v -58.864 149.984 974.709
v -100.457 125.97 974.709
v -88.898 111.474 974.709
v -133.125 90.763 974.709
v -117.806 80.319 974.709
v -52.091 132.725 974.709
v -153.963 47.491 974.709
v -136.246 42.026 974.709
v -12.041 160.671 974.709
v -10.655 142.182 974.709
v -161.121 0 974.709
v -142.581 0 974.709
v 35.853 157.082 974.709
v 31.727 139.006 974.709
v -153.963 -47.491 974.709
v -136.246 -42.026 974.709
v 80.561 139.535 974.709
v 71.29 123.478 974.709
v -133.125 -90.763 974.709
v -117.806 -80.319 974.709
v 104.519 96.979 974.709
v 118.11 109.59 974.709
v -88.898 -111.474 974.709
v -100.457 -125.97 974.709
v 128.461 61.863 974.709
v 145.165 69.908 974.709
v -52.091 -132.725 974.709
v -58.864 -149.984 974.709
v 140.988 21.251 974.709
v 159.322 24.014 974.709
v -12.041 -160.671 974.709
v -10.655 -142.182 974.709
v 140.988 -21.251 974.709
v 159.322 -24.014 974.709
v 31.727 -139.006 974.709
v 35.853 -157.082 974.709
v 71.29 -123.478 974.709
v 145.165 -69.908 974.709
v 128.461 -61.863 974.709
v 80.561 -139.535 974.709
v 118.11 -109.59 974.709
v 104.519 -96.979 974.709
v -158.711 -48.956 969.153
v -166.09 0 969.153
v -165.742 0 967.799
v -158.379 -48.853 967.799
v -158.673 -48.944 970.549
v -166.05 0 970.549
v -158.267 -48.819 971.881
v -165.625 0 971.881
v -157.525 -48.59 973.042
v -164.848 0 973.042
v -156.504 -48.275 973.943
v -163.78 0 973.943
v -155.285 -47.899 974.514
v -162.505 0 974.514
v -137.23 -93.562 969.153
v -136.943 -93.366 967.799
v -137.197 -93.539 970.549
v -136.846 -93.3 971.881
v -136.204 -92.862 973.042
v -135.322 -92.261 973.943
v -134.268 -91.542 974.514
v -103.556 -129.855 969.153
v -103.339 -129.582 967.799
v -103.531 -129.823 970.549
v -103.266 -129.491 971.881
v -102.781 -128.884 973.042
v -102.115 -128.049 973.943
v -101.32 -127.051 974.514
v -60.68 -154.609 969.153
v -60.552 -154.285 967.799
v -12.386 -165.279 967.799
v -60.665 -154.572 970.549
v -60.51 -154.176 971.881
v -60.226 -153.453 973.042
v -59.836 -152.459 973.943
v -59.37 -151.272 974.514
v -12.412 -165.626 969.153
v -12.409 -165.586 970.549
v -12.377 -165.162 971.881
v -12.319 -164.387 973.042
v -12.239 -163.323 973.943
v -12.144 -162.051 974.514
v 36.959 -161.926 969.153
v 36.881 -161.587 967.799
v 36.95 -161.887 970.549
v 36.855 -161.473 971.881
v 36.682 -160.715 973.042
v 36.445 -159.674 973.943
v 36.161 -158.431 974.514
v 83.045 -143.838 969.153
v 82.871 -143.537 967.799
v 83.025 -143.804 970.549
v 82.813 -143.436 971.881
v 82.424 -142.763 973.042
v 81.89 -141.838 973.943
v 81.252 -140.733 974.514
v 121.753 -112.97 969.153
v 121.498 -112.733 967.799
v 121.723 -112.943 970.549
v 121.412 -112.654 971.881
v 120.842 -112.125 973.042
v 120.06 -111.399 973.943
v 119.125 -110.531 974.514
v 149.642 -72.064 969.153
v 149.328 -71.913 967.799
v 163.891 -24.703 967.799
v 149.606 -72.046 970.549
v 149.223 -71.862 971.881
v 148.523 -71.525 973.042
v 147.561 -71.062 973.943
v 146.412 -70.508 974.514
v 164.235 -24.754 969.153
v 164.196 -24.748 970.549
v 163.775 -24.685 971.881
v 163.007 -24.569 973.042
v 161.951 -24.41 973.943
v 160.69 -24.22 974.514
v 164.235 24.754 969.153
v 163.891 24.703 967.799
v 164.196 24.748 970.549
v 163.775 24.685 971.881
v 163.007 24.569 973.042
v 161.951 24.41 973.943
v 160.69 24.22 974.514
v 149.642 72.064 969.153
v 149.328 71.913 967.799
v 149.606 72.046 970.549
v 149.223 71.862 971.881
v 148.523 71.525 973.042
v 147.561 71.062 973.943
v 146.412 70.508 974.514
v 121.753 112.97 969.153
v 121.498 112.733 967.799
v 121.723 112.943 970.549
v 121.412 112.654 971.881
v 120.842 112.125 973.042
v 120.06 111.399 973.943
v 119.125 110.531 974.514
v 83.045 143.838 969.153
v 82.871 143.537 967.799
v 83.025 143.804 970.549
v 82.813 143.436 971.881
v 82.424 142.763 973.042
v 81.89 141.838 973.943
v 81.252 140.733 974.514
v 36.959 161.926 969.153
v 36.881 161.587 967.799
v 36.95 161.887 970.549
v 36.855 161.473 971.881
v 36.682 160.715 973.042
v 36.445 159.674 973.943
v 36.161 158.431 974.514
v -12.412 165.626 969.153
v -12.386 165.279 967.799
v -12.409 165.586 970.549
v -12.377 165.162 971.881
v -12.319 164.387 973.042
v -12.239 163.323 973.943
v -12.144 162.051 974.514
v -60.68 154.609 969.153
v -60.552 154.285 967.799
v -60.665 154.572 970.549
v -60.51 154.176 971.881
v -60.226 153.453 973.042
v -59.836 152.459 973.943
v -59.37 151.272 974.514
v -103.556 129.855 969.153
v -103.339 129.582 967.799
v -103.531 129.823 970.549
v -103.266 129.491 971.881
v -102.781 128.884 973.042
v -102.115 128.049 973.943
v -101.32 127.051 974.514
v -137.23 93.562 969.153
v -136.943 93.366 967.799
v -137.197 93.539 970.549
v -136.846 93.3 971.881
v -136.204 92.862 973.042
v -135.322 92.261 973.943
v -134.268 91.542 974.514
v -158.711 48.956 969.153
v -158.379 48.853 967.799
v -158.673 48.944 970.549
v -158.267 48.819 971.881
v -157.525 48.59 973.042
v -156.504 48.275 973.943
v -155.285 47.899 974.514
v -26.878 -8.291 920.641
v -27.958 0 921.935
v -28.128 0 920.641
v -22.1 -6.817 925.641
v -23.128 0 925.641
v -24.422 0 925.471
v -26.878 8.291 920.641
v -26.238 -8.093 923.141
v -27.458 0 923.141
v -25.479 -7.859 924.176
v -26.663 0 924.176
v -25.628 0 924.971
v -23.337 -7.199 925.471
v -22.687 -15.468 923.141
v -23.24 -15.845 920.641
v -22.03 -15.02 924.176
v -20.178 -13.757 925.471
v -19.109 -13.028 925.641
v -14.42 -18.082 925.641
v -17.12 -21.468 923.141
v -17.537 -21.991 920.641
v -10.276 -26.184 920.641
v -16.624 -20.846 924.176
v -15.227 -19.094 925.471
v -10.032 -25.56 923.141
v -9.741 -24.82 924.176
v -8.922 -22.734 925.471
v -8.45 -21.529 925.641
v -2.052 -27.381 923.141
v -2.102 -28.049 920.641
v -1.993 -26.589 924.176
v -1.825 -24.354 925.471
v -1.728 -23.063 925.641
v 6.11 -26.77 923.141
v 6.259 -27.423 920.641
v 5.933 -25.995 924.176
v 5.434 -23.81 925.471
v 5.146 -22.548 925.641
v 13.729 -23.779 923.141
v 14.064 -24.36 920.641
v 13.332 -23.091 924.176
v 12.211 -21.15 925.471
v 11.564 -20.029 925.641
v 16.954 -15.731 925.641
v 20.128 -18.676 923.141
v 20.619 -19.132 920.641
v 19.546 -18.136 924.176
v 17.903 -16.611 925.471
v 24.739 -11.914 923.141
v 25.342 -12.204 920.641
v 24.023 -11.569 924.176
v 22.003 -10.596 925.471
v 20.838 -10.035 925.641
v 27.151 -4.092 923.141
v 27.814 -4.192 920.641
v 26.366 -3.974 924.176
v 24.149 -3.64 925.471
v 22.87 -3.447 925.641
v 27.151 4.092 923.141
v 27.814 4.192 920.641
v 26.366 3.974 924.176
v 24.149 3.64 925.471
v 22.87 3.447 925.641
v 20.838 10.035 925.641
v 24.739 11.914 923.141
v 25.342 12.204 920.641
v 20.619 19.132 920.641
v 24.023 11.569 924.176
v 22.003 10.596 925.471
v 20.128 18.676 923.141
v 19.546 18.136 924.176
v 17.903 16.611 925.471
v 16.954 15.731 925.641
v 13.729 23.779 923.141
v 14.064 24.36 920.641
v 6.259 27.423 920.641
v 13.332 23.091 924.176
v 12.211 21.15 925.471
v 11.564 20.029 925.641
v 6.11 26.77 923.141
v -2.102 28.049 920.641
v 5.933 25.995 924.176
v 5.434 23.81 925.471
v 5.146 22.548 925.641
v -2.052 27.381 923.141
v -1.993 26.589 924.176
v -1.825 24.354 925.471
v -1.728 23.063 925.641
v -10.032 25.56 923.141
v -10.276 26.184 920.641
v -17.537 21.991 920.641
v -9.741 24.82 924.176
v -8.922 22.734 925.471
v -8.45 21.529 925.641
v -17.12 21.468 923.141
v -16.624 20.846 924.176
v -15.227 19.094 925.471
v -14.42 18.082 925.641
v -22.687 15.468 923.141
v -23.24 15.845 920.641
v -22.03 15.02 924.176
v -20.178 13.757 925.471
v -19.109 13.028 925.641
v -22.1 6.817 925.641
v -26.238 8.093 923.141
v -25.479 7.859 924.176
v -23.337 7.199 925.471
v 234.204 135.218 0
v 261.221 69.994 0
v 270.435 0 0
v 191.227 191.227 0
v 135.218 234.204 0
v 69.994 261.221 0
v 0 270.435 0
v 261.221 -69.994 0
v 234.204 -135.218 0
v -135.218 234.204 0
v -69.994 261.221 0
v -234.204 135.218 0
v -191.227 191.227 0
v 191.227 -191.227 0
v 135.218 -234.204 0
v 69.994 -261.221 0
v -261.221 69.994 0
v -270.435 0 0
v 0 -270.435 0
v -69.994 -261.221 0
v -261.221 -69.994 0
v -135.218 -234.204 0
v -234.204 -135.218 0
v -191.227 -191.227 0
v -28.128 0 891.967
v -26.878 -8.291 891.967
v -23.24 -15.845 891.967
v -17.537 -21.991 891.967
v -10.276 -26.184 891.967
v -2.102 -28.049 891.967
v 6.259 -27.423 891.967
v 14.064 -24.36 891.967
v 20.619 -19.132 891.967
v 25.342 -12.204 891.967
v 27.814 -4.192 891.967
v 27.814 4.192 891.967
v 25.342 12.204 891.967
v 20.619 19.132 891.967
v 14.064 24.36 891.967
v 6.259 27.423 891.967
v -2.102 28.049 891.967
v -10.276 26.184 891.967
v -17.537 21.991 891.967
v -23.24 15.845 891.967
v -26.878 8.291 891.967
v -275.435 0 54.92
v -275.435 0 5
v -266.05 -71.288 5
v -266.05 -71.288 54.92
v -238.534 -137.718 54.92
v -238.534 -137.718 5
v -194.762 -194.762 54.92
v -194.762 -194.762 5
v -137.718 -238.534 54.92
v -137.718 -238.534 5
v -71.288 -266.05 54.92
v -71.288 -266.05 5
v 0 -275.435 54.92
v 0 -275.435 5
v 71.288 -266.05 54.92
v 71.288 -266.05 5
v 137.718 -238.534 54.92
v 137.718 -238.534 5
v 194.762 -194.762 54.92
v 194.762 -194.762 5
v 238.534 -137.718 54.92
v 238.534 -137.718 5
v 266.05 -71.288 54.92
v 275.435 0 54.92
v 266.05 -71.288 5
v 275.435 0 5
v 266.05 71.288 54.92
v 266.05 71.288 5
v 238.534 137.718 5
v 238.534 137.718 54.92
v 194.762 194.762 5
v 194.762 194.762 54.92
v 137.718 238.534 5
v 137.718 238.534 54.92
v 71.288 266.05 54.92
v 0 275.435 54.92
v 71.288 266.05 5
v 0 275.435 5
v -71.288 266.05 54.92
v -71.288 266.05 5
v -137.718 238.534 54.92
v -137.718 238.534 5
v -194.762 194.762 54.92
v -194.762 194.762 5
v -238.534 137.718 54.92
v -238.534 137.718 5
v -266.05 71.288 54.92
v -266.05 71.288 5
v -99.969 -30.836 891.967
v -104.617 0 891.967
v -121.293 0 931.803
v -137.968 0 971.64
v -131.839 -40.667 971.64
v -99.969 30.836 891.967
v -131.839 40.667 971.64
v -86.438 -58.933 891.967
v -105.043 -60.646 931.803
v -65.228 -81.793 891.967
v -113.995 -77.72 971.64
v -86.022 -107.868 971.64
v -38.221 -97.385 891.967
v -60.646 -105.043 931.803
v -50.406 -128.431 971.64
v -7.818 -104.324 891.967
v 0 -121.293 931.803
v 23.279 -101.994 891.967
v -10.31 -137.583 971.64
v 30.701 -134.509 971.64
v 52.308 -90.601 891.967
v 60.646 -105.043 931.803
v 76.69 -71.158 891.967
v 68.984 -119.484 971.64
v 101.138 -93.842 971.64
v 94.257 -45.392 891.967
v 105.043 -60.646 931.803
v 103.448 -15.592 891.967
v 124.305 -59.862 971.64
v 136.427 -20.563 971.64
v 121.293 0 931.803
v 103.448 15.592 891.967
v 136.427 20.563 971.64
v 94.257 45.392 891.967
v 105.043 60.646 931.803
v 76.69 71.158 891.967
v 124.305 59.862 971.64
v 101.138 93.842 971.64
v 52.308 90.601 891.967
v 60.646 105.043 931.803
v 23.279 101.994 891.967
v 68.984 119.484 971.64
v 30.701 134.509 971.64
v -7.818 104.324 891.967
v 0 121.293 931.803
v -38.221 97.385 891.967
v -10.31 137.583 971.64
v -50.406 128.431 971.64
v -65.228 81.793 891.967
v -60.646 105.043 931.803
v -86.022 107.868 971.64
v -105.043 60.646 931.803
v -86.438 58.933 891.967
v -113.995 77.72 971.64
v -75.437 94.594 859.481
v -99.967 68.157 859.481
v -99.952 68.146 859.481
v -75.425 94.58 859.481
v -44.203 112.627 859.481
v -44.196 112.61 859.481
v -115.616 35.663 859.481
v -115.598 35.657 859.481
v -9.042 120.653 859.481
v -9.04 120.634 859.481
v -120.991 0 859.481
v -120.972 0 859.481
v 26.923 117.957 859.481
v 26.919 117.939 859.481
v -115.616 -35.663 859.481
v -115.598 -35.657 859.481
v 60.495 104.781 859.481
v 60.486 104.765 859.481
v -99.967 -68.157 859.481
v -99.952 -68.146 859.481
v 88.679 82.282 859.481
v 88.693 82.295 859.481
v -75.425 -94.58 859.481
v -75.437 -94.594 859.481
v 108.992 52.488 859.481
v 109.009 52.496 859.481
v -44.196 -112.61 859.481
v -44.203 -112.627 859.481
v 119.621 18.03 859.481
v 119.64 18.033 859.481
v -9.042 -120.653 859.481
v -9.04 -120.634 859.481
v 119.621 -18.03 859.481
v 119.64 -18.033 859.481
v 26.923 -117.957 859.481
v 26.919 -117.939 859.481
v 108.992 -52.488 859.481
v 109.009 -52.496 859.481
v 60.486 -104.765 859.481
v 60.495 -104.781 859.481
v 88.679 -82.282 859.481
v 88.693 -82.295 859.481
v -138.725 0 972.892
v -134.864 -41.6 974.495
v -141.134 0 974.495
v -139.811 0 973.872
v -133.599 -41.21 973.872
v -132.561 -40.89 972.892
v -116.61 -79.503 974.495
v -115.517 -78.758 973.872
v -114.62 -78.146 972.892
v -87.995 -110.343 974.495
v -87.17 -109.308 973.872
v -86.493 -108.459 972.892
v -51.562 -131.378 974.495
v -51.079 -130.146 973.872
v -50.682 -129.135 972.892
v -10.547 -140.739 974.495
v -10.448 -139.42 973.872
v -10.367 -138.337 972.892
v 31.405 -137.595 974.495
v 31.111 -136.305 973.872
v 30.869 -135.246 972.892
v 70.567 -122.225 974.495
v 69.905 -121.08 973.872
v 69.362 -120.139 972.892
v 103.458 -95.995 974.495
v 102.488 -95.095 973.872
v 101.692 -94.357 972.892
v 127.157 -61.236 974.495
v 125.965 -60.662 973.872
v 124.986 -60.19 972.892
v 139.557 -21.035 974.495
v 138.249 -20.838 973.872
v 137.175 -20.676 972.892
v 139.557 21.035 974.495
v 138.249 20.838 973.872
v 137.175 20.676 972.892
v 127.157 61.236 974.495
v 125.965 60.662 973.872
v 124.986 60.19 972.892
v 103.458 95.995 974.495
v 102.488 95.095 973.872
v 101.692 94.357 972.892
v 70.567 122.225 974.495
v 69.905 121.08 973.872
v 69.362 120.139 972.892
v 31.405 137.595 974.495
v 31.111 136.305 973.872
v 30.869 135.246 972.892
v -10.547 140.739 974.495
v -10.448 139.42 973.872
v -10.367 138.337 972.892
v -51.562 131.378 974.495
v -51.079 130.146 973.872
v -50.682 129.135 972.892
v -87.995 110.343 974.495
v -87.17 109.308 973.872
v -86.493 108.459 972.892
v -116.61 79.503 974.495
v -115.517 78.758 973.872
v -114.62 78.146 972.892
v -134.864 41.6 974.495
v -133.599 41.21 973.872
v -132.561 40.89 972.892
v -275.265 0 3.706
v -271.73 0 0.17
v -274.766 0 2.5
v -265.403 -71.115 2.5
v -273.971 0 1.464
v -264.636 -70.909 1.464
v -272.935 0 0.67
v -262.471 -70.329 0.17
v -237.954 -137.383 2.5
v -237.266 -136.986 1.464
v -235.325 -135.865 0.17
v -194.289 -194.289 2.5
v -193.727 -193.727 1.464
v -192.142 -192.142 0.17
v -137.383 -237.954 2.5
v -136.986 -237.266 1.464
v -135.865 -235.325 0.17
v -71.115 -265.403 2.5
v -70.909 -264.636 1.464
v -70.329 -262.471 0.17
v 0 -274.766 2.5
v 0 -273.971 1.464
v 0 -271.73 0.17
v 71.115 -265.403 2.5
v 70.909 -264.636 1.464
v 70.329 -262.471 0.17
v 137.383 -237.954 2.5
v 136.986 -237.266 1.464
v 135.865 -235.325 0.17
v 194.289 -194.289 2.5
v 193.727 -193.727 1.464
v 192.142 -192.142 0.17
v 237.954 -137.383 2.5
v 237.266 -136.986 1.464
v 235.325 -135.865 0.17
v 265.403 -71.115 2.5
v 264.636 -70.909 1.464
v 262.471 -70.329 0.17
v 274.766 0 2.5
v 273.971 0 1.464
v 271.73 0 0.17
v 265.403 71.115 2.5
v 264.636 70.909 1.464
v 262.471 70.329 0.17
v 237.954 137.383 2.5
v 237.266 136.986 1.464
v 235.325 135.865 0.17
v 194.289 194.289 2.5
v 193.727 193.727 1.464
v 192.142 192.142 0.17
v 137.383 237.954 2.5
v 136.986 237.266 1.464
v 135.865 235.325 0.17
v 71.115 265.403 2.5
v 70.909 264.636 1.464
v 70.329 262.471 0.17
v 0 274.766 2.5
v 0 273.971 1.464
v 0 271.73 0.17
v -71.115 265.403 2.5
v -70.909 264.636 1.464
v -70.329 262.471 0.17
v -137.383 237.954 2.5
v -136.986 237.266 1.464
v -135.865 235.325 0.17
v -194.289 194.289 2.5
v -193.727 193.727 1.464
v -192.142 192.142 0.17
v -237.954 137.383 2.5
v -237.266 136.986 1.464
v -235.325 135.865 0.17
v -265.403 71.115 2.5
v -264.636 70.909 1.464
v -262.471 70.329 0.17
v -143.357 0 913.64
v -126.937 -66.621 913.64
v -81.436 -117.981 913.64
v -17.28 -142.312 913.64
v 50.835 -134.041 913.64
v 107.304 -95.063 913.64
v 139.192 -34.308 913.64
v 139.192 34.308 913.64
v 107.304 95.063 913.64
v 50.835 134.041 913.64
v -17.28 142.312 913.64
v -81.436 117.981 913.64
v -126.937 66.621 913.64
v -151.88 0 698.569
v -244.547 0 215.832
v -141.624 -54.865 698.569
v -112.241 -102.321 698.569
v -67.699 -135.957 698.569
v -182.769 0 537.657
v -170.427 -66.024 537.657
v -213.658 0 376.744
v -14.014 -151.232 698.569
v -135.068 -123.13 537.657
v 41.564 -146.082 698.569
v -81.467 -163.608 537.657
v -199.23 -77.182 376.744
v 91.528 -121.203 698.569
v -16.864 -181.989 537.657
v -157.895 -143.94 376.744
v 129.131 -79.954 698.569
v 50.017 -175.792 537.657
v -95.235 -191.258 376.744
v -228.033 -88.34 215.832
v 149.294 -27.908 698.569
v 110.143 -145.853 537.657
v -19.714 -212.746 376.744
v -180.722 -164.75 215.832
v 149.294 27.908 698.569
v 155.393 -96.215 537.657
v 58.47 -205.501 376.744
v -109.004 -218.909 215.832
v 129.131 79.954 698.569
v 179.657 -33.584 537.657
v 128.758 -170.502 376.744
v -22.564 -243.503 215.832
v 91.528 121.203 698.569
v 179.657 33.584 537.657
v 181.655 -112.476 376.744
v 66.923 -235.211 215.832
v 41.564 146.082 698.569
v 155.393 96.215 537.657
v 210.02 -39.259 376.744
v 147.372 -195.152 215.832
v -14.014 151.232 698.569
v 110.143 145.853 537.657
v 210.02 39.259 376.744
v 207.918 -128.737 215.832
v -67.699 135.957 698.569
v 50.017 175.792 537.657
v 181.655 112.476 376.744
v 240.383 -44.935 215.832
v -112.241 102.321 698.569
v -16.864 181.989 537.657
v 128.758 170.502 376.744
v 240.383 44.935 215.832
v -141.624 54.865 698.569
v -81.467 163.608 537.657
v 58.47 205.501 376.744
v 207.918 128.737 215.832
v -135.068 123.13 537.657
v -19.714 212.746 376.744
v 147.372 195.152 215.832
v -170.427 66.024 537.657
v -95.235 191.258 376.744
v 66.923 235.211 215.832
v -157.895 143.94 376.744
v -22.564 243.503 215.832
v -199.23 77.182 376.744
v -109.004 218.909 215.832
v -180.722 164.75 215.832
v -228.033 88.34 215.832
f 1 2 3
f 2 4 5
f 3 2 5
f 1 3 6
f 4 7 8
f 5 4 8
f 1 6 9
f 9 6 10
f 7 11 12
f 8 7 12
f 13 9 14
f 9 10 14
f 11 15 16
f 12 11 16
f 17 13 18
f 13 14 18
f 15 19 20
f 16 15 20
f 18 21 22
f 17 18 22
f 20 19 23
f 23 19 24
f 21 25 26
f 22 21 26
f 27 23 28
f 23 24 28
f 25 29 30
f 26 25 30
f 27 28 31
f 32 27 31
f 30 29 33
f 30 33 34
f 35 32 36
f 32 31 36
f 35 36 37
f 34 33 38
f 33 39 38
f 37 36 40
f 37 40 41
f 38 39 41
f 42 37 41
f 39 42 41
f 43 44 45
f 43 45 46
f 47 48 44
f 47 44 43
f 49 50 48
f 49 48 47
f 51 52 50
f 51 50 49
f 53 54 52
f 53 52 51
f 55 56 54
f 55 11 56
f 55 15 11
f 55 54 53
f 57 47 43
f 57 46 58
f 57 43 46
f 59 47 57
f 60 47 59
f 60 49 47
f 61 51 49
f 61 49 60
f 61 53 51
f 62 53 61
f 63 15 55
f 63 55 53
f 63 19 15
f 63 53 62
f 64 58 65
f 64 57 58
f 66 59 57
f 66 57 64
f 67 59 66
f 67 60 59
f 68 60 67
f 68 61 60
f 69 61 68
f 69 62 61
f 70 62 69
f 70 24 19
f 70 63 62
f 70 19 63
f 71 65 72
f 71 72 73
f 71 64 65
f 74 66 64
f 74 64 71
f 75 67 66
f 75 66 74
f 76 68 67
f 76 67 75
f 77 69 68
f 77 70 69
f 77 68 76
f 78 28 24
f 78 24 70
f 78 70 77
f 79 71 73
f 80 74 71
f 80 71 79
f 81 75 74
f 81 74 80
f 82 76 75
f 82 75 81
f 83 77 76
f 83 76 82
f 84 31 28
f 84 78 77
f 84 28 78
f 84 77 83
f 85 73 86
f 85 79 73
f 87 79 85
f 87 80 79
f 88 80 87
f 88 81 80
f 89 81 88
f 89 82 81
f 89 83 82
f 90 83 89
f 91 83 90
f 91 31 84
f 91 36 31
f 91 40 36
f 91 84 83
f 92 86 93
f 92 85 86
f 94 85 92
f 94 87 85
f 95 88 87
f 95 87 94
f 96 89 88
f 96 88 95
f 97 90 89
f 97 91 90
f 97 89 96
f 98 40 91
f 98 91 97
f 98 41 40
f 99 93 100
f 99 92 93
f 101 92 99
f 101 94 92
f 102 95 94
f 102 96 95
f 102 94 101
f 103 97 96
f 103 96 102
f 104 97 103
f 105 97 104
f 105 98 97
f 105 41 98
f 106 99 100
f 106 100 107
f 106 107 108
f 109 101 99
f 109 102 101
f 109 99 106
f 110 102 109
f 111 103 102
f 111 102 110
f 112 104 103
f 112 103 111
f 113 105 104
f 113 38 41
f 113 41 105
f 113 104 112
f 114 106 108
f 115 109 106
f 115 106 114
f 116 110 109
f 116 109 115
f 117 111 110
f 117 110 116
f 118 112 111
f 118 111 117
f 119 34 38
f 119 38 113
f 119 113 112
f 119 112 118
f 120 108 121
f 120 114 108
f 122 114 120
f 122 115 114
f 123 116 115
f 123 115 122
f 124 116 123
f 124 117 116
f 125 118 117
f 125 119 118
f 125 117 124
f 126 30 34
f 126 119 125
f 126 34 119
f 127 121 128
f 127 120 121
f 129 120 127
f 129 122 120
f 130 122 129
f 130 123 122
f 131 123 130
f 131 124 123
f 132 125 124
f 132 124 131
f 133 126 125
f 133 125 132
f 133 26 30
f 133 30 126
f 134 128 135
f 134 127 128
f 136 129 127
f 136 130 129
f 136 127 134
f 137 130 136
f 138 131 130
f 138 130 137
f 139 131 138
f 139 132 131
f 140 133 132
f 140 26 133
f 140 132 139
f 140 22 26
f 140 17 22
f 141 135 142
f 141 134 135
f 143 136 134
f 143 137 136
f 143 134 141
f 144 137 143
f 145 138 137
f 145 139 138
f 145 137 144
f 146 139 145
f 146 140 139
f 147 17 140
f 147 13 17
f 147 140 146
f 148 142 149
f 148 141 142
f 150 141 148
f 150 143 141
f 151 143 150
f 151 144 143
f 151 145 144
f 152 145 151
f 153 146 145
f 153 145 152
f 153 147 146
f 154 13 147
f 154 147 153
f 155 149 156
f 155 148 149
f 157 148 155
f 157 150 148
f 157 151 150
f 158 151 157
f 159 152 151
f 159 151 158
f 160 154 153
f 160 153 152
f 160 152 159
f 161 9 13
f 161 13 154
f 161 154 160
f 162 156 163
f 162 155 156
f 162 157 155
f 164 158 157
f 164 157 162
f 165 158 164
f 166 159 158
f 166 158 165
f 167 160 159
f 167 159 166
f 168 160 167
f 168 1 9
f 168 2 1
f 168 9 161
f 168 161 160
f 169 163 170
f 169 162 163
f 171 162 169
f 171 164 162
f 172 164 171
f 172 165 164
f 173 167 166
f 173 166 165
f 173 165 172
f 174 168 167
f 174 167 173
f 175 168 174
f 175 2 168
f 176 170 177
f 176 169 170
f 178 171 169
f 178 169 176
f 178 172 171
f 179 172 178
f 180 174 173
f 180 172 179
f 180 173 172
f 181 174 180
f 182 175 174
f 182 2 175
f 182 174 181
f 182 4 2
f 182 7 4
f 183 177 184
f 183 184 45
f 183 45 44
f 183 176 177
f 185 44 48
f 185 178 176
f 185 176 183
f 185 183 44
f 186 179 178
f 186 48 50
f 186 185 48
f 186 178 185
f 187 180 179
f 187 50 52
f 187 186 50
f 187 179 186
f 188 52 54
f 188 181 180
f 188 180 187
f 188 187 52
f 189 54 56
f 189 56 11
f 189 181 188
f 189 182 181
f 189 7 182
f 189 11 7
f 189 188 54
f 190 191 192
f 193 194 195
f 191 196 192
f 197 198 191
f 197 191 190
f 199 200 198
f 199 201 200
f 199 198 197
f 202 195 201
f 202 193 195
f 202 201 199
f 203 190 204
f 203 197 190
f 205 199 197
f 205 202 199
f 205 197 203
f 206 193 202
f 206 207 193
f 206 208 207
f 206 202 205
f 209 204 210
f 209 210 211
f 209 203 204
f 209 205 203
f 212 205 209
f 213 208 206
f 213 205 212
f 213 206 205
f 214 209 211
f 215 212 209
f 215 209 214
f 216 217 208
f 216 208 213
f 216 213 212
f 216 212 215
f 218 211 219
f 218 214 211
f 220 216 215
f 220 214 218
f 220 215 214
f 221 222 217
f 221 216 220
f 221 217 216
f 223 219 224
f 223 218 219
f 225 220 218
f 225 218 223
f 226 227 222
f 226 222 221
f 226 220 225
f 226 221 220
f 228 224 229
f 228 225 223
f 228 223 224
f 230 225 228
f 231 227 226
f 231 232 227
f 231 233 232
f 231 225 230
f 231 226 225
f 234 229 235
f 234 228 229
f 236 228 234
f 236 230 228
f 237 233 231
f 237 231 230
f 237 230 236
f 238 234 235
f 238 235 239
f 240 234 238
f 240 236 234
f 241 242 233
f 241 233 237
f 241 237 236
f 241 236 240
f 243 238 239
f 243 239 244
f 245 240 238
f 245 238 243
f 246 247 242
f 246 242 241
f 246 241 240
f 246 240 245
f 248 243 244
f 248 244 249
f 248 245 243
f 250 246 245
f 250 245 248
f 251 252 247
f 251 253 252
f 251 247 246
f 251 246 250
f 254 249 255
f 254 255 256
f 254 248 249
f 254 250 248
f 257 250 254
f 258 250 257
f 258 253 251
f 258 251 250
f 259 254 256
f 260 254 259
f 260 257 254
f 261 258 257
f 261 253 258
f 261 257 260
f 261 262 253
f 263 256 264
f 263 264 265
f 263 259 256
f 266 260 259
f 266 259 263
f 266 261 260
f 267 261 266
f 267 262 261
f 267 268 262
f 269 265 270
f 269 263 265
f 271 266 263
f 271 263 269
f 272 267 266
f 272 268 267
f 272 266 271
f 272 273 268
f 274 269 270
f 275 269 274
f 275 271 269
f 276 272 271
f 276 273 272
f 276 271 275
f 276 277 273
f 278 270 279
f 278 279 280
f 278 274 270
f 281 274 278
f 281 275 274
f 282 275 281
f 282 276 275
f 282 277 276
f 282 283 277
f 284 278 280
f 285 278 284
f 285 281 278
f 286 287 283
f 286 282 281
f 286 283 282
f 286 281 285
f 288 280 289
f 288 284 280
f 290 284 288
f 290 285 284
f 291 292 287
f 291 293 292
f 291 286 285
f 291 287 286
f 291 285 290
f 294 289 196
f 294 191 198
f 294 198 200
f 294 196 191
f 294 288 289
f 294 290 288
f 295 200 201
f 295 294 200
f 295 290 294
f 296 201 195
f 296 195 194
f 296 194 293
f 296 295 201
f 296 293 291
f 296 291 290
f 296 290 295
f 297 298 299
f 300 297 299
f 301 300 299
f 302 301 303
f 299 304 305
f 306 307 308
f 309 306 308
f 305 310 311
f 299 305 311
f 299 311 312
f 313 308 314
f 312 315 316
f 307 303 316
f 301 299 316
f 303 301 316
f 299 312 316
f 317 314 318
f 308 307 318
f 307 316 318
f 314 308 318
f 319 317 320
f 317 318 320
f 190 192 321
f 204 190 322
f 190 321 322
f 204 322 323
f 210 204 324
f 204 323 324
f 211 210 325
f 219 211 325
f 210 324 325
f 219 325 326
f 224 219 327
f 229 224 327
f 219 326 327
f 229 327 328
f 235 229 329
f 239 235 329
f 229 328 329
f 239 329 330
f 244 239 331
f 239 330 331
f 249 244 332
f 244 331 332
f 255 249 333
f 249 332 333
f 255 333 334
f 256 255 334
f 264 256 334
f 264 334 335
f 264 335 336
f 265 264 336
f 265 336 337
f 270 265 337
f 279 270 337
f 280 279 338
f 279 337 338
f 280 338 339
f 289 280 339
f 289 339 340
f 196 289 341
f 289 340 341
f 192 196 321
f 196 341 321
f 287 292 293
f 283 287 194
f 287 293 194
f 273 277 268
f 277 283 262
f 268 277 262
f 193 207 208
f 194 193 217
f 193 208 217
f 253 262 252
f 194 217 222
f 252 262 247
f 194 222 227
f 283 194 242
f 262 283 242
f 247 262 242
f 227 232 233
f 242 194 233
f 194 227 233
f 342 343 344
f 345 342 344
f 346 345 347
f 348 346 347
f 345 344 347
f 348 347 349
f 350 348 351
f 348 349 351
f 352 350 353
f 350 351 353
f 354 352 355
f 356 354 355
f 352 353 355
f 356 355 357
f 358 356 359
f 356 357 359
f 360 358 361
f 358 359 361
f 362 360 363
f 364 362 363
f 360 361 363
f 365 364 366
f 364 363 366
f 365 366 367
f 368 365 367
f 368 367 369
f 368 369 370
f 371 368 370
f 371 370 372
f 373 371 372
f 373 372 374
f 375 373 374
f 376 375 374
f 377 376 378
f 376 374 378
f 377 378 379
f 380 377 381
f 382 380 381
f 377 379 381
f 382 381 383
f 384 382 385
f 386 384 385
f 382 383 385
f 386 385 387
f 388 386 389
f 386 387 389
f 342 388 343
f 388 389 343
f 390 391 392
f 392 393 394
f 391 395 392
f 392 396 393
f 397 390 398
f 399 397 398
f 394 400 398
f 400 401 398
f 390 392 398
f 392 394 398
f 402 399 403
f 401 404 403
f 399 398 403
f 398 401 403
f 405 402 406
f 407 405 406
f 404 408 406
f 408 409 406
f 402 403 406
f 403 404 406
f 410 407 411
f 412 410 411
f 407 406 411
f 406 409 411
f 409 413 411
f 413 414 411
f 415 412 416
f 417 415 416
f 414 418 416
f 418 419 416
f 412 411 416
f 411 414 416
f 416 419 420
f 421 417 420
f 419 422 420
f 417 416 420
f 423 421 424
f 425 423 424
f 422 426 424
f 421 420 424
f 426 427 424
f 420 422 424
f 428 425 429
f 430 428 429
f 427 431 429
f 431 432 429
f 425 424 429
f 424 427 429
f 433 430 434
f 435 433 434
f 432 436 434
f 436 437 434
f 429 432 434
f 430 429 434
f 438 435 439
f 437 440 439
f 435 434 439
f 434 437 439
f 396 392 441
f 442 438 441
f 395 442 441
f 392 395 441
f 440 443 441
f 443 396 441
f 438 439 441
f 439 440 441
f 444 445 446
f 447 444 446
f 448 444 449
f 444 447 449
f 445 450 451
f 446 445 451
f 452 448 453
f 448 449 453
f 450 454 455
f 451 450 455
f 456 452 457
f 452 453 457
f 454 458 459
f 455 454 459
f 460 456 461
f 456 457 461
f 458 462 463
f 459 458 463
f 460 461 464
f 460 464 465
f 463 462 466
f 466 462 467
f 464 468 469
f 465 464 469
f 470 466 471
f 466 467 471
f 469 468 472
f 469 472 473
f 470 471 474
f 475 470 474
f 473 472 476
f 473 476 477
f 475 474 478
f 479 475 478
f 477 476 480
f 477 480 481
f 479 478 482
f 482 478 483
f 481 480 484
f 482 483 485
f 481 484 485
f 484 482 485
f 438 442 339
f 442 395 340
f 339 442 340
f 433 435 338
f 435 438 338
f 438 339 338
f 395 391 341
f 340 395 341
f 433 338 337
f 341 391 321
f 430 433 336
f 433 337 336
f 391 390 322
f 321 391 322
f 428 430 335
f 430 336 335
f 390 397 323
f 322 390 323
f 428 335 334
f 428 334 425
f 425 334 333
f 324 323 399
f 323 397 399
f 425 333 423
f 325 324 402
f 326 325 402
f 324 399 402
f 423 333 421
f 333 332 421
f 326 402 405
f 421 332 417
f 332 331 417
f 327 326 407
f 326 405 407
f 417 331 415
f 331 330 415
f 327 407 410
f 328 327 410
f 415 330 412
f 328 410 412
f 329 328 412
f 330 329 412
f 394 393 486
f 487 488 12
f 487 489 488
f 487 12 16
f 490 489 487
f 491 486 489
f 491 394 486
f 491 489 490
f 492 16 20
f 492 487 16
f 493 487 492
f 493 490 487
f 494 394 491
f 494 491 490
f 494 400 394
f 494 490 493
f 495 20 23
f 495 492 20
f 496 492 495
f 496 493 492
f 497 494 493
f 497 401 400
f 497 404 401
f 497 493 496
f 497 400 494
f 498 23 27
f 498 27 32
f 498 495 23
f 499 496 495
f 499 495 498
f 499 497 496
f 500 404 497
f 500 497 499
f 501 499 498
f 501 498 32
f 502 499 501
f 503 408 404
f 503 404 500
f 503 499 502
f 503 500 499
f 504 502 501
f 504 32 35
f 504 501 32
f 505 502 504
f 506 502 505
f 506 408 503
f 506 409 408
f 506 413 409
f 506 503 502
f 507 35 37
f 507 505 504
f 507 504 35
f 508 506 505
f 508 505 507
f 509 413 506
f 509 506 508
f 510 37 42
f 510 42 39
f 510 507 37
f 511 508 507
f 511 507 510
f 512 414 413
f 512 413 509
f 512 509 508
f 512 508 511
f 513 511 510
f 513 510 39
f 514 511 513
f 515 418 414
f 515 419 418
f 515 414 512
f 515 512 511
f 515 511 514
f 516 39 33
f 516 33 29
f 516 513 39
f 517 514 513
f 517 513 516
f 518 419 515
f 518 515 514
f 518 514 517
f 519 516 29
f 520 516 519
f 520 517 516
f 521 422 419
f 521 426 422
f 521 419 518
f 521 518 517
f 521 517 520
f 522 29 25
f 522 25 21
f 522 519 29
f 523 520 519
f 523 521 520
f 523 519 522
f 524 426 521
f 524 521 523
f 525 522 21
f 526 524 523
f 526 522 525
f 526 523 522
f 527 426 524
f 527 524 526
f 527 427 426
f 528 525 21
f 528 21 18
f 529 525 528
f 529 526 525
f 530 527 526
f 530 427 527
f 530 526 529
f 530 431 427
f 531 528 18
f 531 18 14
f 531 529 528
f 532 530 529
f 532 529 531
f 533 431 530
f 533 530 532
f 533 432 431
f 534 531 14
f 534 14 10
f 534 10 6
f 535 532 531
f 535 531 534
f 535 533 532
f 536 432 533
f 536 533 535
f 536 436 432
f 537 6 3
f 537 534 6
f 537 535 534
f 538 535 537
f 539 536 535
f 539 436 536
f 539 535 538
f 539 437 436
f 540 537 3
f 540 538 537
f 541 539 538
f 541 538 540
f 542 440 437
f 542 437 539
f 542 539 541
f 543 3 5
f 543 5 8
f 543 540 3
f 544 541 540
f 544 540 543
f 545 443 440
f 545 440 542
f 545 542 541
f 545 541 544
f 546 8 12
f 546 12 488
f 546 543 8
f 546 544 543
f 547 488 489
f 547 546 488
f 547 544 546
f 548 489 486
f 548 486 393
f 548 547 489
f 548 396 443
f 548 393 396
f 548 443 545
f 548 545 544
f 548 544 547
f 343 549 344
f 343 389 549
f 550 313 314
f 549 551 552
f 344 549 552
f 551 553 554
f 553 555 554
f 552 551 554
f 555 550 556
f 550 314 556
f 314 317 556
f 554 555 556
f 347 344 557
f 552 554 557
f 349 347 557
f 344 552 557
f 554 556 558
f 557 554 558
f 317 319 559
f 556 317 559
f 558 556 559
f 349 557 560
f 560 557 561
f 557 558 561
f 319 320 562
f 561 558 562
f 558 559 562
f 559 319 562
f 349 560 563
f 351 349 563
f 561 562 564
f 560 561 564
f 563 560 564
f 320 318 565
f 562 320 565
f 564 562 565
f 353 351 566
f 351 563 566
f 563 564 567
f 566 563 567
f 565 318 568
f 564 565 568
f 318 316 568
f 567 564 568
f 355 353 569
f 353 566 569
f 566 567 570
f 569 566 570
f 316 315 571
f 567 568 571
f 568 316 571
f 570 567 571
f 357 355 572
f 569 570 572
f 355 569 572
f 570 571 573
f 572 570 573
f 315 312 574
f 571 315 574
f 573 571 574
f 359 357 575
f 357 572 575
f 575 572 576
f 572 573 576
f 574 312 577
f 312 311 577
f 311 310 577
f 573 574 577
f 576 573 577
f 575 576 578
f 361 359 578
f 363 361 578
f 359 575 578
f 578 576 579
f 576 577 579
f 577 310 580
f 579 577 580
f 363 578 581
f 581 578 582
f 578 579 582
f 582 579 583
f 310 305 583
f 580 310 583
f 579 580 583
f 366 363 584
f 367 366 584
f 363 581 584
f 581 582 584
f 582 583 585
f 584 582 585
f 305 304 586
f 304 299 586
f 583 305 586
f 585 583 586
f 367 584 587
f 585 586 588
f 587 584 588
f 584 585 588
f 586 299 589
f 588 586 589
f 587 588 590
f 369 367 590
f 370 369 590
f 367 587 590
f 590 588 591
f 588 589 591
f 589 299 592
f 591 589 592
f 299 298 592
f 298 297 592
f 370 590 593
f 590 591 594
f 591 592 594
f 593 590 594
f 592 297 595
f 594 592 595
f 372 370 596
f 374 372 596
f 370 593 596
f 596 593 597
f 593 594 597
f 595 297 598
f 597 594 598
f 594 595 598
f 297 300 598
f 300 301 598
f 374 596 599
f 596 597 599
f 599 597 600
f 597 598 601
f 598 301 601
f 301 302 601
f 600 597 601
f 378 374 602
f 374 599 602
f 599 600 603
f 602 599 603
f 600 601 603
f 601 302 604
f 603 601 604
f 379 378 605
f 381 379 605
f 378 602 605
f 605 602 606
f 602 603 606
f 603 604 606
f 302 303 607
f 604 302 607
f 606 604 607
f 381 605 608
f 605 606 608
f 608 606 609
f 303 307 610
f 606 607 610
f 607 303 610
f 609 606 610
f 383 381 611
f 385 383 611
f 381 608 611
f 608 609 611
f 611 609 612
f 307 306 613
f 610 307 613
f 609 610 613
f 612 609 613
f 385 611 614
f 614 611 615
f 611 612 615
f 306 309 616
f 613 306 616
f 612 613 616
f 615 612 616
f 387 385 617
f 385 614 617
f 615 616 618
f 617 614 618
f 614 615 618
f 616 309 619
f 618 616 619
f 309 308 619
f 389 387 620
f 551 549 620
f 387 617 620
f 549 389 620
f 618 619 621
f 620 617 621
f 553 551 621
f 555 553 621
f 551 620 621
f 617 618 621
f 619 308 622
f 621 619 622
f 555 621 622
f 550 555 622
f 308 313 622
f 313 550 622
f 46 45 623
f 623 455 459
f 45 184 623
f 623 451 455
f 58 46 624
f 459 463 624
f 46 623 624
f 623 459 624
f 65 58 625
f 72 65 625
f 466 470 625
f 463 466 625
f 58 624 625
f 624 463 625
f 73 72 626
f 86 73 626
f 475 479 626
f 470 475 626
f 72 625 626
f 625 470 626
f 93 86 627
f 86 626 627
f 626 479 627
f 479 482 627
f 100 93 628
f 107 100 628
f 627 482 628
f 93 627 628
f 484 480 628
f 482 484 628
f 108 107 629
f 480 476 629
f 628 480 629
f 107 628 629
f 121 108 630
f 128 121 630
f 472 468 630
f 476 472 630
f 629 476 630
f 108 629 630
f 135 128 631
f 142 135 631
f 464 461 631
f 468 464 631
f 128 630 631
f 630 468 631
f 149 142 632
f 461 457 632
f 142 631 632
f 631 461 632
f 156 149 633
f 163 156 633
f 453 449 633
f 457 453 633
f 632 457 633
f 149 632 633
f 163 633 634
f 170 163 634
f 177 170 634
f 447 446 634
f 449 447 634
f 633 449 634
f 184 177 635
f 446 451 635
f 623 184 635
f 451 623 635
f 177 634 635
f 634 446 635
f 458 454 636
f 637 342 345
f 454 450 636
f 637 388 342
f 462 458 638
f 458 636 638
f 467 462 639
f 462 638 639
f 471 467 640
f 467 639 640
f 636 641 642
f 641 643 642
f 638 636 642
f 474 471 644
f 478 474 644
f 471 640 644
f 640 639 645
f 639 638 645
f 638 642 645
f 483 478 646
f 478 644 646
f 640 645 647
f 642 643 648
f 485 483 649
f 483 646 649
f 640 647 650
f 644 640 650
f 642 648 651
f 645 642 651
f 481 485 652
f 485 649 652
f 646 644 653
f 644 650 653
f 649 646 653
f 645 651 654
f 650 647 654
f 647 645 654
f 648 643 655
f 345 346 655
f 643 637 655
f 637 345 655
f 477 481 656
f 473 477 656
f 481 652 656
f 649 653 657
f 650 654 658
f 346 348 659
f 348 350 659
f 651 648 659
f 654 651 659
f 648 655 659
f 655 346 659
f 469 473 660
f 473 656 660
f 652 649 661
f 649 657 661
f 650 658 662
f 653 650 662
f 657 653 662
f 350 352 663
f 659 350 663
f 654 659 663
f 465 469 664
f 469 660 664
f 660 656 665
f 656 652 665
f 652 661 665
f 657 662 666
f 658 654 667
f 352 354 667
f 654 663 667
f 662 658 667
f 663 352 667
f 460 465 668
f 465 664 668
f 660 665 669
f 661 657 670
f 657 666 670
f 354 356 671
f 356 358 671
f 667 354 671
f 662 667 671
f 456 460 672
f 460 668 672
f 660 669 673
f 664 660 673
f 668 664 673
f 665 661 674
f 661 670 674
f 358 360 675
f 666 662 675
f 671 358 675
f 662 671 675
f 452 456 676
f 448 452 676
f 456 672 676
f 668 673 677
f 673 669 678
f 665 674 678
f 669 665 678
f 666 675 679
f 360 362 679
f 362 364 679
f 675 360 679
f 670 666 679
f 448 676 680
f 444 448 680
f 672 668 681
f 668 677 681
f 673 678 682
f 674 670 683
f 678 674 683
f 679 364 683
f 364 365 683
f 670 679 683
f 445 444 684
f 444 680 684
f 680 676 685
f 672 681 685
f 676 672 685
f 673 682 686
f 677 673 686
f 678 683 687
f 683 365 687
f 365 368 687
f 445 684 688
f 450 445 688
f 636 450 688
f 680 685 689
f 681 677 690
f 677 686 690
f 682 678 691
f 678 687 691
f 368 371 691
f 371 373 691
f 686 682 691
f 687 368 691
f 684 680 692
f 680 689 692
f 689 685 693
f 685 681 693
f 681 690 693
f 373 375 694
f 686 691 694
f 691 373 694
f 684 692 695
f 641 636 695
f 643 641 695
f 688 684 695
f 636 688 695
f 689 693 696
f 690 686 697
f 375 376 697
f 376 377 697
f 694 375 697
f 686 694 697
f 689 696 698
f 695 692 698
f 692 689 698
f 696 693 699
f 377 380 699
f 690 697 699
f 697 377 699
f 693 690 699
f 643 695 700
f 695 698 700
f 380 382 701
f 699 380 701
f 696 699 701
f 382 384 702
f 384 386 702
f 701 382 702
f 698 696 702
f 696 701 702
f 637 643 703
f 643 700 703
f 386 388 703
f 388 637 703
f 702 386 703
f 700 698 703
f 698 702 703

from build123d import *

# Parameters (mm, degrees)
F5_R = 5
F6_R = 5
F7_R = 5
F8_R = 5


with BuildPart() as f3:
    # F0 (on Front) → F3 (revolve)
    with BuildSketch(Plane.XZ):
        Polygon((-275.435489, 0), (0, 0), (0, 859.48139), (-120.990893, 859.48139), (-275.435489, 54.919829), align=None)
    revolve(axis=Axis((0, 0, 550.116003), (0, 0, 1)))

    # F2 (on Front) → F4 (revolve)
    with BuildSketch(Plane.XZ):
        Polygon((-168.598086, 974.709213), (-120.936424, 859.394491), (0, 859.254301), (0, 925.640881), (-28.12794, 925.640881), (-28.12794, 891.966522), (-104.616828, 891.966522), (-139.253303, 974.709213), align=None)
    revolve(axis=Axis((0, 0, 550.116003), (0, 0, 1)))

    # F5
    f5_edges = [f3.edges().sort_by_distance(p)[0] for p in [
        (168.598086, 0, 974.709213),
    ]]
    fillet(f5_edges, radius=F5_R)

    # F6
    f6_edges = [f3.edges().sort_by_distance(p)[0] for p in [
        (139.253303, 0, 974.709213),
    ]]
    fillet(f6_edges, radius=F6_R)

    # F7
    f7_edges = [f3.edges().sort_by_distance(p)[0] for p in [
        (28.12794, 0, 925.640881),
    ]]
    fillet(f7_edges, radius=F7_R)

    # F8
    f8_edges = [f3.edges().sort_by_distance(p)[0] for p in [
        (275.435489, 0, 0),
    ]]
    fillet(f8_edges, radius=F8_R)


solid = f3.part
